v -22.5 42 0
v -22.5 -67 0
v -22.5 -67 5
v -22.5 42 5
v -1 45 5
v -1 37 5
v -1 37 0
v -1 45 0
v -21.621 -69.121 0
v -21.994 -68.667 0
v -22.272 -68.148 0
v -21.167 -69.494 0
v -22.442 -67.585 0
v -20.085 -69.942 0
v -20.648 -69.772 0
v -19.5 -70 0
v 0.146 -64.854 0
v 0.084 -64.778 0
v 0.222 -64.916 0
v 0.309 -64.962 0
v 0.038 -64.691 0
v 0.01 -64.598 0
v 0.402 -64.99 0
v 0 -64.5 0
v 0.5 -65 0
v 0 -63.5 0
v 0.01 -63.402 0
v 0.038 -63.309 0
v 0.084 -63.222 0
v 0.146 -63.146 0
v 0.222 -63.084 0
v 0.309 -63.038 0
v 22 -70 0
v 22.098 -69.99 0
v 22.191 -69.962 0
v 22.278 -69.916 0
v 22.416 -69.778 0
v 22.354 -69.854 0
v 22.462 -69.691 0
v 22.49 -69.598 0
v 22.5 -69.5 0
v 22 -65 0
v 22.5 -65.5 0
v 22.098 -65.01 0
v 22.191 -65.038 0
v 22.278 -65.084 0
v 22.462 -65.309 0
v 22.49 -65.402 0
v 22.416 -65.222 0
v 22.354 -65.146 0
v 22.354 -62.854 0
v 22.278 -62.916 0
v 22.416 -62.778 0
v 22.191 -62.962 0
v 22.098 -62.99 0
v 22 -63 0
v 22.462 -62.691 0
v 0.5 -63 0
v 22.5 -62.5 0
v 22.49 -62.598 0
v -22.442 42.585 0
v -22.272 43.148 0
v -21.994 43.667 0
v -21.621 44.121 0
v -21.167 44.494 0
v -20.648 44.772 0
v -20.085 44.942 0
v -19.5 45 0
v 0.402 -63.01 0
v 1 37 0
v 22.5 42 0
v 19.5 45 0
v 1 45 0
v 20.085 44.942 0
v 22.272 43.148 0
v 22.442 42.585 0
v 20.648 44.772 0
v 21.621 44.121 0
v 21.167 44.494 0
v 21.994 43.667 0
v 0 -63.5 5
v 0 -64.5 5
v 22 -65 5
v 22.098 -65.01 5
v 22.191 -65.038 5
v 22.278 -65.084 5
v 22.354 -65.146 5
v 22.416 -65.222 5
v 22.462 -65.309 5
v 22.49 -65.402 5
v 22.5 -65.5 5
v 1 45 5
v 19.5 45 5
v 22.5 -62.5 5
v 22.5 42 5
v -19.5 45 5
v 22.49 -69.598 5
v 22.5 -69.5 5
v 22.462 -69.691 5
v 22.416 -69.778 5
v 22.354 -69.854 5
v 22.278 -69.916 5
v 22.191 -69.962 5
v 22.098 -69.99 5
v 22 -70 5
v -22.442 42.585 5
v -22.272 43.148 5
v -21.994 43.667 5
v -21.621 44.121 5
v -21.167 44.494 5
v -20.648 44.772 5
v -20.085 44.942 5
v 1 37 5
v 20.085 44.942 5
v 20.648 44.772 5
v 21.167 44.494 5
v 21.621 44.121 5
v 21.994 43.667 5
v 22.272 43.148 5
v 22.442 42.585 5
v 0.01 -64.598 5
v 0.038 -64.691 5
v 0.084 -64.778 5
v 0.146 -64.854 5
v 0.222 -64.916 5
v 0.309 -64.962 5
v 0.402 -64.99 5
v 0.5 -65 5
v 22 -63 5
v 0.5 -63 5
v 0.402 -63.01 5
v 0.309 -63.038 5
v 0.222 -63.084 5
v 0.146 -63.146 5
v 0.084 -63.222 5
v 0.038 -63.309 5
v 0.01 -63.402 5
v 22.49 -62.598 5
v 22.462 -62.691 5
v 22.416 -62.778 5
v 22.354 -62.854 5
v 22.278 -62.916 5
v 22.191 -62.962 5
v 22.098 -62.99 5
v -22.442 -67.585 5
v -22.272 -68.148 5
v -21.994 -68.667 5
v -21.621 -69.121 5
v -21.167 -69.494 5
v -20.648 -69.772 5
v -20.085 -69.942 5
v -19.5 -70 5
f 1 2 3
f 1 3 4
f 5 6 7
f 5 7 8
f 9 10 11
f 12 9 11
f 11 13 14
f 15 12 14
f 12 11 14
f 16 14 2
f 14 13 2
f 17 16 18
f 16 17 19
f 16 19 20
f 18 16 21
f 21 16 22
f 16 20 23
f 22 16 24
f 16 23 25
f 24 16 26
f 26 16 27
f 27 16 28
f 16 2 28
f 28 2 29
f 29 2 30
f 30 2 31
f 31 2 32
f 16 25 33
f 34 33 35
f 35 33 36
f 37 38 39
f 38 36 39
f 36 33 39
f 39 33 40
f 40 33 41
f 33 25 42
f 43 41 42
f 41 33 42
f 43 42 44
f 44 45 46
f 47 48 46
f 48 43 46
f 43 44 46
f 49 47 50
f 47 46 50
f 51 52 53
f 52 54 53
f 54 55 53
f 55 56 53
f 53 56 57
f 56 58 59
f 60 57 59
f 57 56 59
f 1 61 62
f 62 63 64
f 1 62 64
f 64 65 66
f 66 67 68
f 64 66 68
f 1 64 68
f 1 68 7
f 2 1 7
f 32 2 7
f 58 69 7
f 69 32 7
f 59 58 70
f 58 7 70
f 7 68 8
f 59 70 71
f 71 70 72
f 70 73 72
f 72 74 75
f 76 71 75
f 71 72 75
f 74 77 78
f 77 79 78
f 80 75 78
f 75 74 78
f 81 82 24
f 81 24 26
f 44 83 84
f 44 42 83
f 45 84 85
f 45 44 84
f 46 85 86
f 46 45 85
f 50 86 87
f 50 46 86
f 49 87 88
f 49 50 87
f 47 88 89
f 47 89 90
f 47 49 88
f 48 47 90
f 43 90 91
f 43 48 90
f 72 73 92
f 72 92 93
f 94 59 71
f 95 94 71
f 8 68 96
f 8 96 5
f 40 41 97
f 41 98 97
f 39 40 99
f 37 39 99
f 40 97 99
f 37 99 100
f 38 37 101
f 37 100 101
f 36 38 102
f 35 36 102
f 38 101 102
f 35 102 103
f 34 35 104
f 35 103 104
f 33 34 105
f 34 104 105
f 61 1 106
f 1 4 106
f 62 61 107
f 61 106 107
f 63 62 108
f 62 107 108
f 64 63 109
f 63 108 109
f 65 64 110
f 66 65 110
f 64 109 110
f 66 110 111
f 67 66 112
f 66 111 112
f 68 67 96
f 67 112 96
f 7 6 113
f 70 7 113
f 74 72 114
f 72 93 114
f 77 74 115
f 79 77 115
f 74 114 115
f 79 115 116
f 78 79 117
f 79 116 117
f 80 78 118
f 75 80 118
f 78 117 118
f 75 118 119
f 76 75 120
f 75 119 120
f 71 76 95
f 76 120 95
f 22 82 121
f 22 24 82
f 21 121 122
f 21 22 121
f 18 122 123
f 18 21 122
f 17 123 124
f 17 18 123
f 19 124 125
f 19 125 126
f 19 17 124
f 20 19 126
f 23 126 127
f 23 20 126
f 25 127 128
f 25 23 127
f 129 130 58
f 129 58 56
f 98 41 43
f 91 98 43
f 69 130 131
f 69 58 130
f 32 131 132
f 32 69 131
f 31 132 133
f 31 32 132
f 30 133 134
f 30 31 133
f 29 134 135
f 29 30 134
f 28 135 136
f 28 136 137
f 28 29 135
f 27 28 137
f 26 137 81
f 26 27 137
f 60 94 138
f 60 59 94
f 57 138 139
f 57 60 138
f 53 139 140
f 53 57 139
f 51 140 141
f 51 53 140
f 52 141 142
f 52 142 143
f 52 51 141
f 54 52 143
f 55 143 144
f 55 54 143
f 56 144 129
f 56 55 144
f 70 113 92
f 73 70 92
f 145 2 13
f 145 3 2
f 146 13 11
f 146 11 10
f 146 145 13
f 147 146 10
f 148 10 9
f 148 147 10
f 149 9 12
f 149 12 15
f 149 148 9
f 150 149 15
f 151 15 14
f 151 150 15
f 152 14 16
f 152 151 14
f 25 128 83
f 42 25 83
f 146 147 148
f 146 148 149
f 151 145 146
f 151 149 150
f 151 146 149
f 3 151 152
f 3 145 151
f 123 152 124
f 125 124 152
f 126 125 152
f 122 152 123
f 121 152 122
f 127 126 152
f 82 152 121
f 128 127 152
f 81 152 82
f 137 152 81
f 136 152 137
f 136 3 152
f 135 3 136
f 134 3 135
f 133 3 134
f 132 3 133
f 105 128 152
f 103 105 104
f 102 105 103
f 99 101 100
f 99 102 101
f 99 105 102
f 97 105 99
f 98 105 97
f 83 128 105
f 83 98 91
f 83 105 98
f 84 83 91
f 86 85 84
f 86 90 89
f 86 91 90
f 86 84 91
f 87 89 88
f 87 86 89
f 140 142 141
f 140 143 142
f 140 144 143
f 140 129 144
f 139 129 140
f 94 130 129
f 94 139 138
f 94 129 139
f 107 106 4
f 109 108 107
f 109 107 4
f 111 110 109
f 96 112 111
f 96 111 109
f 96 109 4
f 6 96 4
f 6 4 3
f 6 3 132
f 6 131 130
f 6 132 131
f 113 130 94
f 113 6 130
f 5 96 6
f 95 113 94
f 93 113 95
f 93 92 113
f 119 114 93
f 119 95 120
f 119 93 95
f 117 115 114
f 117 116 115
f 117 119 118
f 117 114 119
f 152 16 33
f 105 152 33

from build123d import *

# Parameters (mm, degrees)
CROQUIS1_W              = 45
CROQUIS1_H              = 115
SALIENTE_EXTRUIR1_DEPTH = 5
CROQUIS3_W              = 22.5
CROQUIS3_H              = 2
CORTAR_EXTRUIR2_DEPTH   = 5
REDONDEO1_R             = 3
CROQUIS4_W              = 2
CROQUIS4_H              = 8
CORTAR_EXTRUIR3_DEPTH   = 5
REDONDEO2_R             = 0.5


with BuildPart() as part:
    # Croquis1 → Saliente-Extruir1 (new body)
    with BuildSketch(Plane.XY):
        with Locations((0, -12.5)):
            Rectangle(CROQUIS1_W, CROQUIS1_H)
    extrude(amount=SALIENTE_EXTRUIR1_DEPTH)

    # Croquis3 → Cortar-Extruir2 (cut)
    with BuildSketch(Plane.XY.offset(5)):
        with Locations((11.25, -64)):
            Rectangle(CROQUIS3_W, CROQUIS3_H)
    extrude(amount=-CORTAR_EXTRUIR2_DEPTH, mode=Mode.SUBTRACT)

    # Redondeo1
    redondeo1_edges = [part.edges().sort_by_distance(p)[0] for p in [
        (-22.5, 45, 2.5),
        (-22.5, -70, 2.5),
        (22.5, 45, 2.5),
    ]]
    fillet(redondeo1_edges, radius=REDONDEO1_R)

    # Croquis4 → Cortar-Extruir3 (cut)
    with BuildSketch(Plane.XY.offset(5)):
        with Locations((0, 41)):
            Rectangle(CROQUIS4_W, CROQUIS4_H)
    extrude(amount=-CORTAR_EXTRUIR3_DEPTH, mode=Mode.SUBTRACT)

    # Redondeo2
    redondeo2_edges = [part.edges().sort_by_distance(p)[0] for p in [
        (0, -63, 2.5),
        (0, -65, 2.5),
        (22.5, -65, 2.5),
        (22.5, -63, 2.5),
        (22.5, -70, 2.5),
    ]]
    fillet(redondeo2_edges, radius=REDONDEO2_R)


solid = part.part
